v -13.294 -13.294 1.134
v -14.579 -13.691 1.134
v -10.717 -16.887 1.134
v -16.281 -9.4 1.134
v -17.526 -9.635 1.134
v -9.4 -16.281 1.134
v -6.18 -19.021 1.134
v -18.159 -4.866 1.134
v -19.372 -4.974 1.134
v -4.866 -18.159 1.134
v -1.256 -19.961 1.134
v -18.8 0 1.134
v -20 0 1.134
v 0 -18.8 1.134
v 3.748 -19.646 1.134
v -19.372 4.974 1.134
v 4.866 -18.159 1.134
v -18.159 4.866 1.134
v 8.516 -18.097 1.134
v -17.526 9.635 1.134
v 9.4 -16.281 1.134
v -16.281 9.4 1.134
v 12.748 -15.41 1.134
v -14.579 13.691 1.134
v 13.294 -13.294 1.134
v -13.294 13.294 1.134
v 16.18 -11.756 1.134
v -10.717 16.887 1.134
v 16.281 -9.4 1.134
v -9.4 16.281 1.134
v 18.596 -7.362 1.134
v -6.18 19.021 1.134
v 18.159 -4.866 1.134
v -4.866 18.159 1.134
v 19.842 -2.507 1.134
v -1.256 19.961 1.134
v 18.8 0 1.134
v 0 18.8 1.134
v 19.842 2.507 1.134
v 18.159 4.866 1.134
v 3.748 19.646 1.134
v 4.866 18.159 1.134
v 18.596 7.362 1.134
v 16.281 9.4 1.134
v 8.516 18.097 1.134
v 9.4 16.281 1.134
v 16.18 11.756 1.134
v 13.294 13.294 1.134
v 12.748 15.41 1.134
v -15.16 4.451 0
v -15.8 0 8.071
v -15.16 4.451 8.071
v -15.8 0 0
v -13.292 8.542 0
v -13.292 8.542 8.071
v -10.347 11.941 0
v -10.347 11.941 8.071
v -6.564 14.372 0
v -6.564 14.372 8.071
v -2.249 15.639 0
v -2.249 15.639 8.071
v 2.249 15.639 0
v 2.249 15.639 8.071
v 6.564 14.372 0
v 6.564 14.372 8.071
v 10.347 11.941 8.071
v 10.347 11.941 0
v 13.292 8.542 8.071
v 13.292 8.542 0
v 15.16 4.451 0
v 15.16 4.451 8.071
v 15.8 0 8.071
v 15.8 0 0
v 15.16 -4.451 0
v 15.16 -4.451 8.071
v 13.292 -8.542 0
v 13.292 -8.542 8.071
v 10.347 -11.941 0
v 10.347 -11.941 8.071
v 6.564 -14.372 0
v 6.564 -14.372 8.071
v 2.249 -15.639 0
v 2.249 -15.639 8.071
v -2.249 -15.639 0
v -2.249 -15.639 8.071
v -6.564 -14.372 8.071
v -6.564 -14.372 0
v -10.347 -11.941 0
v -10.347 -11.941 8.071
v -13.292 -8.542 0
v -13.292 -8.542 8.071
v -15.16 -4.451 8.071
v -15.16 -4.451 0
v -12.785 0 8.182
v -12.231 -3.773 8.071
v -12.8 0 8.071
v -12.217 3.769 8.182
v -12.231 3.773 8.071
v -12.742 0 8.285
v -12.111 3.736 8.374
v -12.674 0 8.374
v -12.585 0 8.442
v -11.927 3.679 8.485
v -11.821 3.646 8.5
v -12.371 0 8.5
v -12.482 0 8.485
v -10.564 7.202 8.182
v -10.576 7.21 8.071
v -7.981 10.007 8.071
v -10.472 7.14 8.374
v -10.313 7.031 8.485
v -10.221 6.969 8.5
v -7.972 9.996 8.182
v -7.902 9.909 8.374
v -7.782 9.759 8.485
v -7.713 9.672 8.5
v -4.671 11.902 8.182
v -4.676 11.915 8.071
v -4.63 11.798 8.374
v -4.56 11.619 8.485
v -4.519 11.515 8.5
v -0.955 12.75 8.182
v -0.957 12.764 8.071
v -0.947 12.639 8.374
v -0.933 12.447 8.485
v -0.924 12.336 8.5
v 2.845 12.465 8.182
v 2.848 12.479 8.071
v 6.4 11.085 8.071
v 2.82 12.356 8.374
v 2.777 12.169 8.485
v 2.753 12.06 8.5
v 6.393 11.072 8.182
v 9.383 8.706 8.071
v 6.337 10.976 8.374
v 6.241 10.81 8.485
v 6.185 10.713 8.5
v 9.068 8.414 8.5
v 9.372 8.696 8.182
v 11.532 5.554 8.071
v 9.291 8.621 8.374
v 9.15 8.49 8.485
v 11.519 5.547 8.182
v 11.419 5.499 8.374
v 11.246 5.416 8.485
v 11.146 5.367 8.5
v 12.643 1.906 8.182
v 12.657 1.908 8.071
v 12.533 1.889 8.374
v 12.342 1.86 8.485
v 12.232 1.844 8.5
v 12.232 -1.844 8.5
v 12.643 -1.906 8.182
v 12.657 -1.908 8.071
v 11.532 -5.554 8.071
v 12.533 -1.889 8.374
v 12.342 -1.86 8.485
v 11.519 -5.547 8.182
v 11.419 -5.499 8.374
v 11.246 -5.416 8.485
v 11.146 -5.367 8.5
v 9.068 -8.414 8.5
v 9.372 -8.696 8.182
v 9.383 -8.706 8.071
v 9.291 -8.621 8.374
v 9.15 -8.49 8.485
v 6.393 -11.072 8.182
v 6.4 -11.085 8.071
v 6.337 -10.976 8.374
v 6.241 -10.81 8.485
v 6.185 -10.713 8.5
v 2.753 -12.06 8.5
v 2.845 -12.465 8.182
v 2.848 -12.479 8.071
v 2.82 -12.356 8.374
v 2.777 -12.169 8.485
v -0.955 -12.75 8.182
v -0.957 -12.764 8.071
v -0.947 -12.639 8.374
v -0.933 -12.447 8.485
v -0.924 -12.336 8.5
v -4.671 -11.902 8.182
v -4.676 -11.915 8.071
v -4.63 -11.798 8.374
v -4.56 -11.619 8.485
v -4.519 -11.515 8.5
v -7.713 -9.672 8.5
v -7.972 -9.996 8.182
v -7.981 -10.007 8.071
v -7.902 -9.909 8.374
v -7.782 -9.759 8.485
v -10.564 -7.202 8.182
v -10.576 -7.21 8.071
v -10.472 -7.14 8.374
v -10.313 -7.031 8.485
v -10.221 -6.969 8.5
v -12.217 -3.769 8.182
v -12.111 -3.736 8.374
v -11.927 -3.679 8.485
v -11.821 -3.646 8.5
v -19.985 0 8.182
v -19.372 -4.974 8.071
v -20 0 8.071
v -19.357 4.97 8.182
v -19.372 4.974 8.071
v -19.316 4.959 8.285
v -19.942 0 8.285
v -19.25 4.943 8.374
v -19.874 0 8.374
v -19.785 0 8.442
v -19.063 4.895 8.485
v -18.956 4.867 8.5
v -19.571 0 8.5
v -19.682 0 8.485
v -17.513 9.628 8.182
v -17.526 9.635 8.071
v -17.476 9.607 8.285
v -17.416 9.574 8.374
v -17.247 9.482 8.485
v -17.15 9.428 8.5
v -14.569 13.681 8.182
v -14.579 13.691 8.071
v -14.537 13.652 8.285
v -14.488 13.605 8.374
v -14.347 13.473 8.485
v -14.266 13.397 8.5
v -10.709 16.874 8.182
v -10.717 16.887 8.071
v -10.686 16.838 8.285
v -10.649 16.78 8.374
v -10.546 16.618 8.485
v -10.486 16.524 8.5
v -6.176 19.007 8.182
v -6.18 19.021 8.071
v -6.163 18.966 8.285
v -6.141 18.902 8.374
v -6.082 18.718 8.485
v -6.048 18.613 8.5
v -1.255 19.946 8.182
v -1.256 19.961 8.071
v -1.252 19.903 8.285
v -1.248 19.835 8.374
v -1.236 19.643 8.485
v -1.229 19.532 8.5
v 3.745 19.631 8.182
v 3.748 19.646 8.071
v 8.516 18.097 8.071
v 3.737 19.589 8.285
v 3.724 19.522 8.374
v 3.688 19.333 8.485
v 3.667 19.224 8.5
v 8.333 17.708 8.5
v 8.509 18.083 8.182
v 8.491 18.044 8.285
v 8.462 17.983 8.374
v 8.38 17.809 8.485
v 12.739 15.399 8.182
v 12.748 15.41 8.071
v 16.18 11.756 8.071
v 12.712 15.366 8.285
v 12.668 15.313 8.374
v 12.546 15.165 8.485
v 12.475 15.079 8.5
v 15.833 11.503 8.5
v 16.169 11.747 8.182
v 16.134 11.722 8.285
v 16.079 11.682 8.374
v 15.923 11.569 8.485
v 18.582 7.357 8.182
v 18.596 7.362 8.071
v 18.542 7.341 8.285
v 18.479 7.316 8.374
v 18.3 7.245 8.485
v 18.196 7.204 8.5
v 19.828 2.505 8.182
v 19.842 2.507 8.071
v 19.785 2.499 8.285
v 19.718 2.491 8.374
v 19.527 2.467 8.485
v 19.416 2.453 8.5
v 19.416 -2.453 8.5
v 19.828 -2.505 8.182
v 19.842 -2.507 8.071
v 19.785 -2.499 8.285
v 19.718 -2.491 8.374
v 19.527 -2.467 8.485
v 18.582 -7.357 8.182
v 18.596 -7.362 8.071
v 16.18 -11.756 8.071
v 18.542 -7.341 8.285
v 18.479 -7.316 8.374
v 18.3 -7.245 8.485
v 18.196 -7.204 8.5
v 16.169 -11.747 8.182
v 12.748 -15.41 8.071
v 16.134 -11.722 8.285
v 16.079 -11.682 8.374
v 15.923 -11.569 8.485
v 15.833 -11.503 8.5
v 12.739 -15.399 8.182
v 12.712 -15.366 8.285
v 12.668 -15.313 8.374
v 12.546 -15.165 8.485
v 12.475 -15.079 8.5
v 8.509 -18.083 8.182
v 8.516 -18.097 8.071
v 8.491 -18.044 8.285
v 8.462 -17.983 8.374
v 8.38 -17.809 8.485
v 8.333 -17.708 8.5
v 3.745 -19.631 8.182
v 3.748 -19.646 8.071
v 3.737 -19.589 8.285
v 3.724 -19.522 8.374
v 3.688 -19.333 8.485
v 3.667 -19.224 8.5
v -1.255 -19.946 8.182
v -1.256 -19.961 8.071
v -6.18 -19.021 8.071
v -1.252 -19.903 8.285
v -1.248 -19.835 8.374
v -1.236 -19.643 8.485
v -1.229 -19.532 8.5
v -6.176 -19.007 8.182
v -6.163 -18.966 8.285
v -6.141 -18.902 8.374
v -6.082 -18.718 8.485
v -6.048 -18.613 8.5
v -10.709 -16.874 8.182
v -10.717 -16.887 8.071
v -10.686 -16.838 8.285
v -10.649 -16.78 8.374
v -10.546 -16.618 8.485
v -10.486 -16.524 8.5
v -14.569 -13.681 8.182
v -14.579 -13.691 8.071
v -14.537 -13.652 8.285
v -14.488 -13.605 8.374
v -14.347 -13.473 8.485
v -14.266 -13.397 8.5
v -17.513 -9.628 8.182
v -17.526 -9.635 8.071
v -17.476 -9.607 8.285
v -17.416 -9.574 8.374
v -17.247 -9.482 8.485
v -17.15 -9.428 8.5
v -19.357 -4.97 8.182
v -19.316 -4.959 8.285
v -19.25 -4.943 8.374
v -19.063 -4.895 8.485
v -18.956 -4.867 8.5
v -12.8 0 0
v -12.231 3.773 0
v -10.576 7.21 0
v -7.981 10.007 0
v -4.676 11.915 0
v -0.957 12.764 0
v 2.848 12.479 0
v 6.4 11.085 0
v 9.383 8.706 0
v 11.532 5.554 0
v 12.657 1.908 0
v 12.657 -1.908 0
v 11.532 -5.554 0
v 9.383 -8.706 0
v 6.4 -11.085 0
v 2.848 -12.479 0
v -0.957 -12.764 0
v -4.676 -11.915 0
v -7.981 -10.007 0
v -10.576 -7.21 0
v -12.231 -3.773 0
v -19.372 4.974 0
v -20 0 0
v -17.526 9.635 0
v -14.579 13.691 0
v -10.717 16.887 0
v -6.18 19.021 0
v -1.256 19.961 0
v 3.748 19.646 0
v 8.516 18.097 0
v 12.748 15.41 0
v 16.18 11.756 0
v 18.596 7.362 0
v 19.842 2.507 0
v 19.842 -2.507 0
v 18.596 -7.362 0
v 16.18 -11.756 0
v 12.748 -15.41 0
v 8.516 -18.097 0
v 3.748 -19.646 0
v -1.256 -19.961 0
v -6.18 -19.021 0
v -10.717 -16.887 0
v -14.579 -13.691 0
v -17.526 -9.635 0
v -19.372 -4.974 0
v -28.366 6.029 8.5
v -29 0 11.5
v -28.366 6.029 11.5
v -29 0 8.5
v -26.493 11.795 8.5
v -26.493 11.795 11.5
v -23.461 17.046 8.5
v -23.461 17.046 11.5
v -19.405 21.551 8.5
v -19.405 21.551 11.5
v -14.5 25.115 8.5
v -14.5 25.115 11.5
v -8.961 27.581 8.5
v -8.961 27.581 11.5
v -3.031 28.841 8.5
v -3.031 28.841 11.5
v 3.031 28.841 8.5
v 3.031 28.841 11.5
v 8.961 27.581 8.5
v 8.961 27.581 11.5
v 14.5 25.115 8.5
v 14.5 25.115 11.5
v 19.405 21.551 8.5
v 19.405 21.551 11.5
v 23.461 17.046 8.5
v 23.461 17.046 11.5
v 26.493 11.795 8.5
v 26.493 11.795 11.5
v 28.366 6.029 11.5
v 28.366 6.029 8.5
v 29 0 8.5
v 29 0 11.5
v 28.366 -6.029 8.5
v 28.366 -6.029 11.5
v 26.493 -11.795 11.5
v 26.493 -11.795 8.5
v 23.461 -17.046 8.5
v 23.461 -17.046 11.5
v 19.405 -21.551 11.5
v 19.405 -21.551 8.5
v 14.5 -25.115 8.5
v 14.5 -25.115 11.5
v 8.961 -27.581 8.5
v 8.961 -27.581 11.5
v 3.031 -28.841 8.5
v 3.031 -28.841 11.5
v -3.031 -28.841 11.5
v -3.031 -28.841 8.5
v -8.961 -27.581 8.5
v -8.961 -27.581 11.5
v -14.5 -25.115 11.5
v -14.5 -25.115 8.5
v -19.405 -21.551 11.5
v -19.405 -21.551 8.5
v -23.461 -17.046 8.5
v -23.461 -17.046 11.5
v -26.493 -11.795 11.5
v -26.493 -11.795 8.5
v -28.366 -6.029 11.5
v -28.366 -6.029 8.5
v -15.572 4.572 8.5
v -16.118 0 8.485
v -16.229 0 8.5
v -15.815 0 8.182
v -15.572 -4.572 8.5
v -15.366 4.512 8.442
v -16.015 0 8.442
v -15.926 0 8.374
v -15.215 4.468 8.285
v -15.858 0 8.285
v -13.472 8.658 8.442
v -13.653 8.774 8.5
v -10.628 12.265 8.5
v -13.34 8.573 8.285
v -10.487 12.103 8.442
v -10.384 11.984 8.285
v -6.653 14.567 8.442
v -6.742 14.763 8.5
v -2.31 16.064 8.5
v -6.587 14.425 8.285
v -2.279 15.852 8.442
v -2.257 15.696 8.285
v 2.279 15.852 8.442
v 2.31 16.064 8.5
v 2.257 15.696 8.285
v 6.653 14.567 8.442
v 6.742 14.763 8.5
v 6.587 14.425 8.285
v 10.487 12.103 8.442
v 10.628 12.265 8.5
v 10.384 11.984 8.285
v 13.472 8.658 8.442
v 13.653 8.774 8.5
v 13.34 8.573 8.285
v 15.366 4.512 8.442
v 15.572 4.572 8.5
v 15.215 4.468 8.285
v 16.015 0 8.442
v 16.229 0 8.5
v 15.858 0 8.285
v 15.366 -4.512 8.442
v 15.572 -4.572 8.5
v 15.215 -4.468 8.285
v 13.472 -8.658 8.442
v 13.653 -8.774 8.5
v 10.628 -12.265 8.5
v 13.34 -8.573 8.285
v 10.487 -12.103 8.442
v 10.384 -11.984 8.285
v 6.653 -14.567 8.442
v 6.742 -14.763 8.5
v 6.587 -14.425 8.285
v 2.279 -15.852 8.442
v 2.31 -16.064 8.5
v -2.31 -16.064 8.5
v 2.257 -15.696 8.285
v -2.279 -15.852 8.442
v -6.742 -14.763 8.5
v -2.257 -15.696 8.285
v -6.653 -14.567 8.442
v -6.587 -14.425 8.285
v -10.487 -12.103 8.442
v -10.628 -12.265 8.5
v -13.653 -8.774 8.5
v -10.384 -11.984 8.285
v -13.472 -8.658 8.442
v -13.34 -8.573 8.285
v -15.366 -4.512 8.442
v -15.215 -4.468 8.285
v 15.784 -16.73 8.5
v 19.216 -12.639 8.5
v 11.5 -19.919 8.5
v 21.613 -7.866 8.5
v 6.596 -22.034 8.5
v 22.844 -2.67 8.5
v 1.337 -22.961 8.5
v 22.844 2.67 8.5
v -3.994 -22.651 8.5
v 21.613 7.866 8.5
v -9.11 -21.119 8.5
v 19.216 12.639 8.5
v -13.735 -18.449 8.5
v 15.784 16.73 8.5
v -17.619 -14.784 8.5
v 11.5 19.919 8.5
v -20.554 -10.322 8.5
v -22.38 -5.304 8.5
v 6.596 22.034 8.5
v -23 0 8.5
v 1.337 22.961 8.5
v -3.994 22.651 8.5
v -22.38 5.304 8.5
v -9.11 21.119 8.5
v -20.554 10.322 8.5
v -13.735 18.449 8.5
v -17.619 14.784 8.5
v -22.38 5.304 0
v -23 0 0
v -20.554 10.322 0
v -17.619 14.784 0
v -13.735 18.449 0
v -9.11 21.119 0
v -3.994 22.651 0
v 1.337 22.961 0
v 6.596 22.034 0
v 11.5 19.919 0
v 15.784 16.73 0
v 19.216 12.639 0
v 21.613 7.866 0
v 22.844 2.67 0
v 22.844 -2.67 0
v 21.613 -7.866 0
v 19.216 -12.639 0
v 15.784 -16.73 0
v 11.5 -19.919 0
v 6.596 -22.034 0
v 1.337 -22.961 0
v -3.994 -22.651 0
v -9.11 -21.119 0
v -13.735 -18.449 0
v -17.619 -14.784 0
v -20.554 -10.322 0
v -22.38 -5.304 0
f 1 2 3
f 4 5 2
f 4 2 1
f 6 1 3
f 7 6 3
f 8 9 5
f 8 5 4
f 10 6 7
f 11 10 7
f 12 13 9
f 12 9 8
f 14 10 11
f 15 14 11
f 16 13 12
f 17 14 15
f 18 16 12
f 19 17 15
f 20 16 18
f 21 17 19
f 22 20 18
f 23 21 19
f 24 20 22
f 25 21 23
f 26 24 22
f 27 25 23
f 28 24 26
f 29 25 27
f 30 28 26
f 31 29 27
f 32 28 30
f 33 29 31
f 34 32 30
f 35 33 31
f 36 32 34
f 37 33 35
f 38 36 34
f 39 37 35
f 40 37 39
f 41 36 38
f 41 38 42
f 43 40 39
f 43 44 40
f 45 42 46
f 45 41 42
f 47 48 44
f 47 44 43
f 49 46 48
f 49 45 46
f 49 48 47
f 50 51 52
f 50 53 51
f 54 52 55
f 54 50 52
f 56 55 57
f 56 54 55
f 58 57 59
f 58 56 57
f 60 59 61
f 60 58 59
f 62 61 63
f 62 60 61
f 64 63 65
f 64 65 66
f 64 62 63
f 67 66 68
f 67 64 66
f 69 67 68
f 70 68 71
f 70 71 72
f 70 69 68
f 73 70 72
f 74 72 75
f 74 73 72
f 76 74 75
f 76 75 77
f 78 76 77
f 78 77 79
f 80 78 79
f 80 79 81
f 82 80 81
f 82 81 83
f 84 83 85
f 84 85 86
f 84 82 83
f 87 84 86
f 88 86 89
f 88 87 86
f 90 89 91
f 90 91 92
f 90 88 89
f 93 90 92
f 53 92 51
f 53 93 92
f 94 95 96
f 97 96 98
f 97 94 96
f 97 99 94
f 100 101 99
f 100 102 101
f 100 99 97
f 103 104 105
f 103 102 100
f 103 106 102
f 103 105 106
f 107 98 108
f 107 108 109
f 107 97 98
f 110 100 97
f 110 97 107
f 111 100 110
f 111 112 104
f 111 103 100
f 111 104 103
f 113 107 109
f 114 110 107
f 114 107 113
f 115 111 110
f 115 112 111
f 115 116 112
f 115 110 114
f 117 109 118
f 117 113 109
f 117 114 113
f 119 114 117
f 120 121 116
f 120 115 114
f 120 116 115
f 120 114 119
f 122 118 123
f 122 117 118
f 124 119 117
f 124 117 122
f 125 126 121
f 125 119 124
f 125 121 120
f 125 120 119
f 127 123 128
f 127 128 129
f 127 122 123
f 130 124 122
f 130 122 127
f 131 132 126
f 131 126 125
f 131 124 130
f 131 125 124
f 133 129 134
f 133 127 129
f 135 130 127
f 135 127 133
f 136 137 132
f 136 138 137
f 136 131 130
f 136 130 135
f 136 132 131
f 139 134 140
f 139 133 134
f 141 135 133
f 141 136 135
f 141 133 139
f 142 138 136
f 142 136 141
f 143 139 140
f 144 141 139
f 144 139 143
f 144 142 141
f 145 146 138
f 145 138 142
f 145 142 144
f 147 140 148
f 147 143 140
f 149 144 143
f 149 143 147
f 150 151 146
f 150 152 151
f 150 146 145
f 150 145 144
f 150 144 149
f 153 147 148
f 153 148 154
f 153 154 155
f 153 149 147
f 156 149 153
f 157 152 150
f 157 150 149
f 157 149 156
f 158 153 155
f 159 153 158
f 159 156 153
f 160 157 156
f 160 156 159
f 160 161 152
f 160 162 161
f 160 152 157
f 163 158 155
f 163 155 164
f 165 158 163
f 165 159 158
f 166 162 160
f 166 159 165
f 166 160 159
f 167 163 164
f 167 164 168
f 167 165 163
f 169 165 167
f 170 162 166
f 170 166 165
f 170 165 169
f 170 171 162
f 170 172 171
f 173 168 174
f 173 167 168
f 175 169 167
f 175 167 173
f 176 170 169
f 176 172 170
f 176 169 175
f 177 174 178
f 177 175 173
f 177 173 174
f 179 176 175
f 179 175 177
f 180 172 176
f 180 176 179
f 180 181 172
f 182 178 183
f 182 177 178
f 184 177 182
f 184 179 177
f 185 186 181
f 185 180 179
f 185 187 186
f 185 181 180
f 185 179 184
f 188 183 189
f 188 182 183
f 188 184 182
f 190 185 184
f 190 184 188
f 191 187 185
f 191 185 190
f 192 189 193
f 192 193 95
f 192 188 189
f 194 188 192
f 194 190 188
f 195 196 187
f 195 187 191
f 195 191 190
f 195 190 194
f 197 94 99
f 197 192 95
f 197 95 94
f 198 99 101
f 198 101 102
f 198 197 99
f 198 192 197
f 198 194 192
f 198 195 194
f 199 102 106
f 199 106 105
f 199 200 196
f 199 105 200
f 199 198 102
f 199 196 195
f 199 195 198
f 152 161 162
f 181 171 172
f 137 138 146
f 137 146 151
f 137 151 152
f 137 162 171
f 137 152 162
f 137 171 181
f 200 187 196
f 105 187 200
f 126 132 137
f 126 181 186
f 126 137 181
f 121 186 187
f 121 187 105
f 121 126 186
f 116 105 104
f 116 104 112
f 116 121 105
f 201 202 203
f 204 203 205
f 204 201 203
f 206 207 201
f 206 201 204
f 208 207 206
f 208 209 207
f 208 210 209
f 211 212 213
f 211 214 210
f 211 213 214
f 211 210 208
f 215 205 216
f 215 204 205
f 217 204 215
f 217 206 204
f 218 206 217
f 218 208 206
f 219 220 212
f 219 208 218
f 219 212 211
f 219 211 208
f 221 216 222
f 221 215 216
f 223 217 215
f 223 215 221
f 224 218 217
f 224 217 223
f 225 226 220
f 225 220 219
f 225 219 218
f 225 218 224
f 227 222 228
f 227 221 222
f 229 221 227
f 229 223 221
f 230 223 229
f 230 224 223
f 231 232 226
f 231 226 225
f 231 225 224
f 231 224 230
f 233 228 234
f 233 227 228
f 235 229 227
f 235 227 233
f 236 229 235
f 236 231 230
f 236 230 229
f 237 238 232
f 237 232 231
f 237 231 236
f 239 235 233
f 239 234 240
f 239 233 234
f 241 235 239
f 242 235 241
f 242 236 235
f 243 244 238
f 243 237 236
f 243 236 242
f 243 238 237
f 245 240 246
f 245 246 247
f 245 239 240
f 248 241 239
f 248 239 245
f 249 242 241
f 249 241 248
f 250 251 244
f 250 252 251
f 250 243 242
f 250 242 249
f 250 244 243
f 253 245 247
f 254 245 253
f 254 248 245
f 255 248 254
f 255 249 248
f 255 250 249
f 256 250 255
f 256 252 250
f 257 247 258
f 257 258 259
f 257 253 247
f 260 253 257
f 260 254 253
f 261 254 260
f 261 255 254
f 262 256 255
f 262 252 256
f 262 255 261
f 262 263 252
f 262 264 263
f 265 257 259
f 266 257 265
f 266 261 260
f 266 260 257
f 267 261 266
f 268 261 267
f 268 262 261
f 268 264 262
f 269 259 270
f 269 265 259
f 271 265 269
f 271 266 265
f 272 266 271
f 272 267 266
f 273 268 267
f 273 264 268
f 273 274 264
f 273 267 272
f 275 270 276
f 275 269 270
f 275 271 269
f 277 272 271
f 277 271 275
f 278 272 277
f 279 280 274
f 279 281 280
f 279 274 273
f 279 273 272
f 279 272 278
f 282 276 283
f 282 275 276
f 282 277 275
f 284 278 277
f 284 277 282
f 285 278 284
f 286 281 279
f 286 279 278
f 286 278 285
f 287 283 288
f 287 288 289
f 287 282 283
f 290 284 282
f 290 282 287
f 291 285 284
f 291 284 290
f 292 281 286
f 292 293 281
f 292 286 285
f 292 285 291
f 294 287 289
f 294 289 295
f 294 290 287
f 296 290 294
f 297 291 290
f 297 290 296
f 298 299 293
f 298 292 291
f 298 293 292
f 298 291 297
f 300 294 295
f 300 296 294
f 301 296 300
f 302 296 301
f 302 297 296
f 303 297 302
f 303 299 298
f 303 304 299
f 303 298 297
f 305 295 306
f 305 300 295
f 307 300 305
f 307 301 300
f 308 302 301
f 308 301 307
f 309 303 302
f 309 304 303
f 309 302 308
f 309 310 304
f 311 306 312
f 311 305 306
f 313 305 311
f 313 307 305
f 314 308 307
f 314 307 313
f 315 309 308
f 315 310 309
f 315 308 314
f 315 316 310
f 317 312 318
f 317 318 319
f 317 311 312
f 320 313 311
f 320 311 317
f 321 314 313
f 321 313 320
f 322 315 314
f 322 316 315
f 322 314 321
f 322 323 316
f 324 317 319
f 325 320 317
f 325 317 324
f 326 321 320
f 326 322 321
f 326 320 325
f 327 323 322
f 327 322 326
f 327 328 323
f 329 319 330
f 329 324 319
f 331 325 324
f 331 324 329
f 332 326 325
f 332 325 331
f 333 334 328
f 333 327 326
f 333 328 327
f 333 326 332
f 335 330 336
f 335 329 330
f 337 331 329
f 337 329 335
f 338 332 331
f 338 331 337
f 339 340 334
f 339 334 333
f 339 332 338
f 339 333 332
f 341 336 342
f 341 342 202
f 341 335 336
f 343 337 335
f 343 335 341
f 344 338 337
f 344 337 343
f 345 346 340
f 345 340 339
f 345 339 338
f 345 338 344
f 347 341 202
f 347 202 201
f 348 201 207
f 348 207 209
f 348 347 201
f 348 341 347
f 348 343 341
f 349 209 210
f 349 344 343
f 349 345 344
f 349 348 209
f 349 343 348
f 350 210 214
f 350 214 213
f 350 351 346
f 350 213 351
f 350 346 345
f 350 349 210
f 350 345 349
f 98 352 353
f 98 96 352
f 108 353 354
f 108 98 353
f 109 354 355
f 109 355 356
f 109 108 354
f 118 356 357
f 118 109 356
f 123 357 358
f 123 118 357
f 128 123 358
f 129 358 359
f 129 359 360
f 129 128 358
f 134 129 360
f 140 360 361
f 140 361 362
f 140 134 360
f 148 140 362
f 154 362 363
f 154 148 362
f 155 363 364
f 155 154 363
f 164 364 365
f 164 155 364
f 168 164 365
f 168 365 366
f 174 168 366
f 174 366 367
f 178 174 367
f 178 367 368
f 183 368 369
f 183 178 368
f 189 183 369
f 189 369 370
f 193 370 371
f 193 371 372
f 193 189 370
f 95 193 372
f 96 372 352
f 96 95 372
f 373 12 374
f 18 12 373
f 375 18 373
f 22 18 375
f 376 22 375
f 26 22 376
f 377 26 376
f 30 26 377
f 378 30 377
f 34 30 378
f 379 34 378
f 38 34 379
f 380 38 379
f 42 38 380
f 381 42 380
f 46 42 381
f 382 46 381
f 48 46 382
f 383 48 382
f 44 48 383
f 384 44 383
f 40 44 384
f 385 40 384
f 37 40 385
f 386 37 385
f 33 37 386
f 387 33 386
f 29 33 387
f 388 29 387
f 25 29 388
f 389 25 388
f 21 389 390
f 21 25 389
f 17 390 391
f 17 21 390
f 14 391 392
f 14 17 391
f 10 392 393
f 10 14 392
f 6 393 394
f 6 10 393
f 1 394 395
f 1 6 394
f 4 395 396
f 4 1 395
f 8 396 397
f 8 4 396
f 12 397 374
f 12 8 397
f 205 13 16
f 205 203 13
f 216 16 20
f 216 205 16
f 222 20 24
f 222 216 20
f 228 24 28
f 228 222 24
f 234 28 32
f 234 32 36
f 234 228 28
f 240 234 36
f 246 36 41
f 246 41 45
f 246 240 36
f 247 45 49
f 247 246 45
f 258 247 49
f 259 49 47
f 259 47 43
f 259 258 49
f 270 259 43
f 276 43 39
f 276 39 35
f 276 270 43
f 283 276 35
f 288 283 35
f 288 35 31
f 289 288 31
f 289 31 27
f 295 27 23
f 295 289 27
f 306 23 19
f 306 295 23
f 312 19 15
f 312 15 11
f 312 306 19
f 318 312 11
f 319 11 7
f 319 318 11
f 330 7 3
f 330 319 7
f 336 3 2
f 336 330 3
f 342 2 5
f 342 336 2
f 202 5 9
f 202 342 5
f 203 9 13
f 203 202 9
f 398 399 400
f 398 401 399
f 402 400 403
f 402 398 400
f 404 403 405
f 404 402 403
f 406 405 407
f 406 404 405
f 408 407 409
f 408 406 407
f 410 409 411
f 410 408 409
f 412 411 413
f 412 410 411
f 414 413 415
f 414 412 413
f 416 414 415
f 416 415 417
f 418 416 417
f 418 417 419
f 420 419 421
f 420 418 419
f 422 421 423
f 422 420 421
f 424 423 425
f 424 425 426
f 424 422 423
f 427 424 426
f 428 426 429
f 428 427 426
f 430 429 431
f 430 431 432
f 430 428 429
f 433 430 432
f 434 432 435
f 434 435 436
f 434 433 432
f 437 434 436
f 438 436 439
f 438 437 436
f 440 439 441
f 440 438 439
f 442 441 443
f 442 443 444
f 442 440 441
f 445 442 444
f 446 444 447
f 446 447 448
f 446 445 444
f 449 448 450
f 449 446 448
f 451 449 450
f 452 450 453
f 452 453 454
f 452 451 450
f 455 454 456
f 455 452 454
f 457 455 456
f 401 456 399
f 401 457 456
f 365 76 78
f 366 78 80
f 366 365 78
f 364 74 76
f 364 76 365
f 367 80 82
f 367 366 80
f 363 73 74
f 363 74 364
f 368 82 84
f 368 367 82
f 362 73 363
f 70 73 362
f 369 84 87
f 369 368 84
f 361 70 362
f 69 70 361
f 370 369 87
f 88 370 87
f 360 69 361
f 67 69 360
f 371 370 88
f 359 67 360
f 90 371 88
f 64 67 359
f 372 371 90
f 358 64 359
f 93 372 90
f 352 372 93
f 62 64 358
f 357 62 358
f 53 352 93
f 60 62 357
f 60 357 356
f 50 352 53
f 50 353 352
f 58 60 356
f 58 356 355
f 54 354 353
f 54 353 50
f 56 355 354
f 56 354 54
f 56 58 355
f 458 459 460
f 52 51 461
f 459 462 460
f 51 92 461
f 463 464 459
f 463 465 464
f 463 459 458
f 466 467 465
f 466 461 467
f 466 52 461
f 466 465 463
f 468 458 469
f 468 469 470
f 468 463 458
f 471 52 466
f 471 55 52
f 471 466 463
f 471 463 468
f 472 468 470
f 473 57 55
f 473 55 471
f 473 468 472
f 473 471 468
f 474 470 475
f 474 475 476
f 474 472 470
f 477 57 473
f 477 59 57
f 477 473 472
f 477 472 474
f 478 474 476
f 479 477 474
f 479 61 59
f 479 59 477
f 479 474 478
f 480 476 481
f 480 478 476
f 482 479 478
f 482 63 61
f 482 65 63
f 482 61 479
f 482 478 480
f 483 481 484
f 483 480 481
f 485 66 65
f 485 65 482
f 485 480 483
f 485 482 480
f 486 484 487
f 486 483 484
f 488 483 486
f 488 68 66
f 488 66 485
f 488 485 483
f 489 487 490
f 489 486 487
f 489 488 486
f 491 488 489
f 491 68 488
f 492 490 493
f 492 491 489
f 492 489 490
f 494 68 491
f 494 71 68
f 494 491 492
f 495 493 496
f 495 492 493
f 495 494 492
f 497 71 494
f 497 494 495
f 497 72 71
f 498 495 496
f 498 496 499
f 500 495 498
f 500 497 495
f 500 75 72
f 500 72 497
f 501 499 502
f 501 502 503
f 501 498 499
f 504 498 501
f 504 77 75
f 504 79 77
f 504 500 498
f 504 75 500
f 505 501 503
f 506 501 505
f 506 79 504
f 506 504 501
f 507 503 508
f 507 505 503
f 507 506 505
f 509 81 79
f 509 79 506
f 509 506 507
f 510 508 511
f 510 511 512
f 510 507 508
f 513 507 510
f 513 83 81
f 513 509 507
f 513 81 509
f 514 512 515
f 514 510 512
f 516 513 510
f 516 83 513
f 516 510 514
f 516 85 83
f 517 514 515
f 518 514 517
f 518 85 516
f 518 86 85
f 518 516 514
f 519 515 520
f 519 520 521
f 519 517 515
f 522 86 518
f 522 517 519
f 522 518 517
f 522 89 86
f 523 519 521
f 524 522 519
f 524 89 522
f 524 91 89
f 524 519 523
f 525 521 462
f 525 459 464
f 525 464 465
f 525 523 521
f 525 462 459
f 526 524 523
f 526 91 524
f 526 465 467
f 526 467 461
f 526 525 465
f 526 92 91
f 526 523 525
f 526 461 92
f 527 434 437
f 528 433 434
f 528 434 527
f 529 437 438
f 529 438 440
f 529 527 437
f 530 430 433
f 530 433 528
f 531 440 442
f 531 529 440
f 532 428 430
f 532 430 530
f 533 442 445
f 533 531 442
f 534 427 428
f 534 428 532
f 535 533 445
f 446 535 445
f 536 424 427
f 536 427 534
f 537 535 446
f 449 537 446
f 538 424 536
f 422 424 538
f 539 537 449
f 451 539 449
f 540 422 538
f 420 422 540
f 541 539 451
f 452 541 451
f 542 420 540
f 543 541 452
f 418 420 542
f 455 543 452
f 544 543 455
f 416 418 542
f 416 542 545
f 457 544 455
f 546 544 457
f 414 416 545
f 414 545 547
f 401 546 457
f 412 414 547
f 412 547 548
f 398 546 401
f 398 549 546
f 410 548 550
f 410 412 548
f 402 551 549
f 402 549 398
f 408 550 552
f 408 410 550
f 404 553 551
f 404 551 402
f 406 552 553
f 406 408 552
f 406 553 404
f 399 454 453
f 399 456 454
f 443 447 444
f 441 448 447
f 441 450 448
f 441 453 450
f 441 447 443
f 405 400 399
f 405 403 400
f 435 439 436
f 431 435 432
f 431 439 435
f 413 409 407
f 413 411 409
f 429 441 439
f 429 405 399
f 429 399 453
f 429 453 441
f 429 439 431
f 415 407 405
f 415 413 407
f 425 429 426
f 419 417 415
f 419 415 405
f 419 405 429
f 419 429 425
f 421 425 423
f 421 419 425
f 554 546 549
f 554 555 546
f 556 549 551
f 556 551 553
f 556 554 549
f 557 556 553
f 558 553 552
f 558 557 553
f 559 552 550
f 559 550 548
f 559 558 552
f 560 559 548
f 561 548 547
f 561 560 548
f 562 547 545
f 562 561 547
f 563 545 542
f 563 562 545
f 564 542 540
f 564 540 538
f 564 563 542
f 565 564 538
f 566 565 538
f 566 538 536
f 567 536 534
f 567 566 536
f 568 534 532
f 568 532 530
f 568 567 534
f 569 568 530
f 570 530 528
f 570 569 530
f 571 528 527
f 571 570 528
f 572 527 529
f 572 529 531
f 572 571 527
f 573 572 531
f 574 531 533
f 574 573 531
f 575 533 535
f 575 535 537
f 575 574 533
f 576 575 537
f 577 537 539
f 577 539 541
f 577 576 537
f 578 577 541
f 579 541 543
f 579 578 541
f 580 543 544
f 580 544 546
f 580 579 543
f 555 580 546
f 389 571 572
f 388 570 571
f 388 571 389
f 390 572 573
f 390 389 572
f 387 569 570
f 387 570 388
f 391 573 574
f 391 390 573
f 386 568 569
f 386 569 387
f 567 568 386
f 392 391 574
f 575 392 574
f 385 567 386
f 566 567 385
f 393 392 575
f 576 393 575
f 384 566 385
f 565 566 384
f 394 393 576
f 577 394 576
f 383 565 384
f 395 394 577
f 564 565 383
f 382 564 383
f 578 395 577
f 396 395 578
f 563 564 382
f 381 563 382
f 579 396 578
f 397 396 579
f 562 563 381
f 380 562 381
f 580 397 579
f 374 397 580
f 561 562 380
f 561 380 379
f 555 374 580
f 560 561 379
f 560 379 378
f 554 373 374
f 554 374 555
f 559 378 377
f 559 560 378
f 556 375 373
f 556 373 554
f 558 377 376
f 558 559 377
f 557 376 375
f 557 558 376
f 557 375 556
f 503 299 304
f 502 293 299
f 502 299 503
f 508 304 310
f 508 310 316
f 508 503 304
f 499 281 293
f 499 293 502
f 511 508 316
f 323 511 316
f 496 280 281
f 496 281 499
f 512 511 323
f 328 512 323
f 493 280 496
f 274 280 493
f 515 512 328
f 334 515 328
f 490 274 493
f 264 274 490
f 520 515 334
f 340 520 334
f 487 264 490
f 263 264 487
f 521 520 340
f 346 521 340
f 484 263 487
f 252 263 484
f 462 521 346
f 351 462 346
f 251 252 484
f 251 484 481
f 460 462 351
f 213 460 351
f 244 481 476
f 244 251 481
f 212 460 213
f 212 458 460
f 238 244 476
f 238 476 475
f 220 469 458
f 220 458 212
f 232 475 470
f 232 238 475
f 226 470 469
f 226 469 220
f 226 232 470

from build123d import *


with BuildPart() as f1:
    # F0 (on Front) → F1 (revolve)
    with BuildSketch(Plane.XZ):
        with BuildLine():
            Line((-15.8, 8.07061), (-15.8, 0))
            Line((-15.8, 0), (-12.8, 0))
            Line((-12.8, 0), (-12.8, 8.07061))
            ThreePointArc((-12.8, 8.07061), (-12.674235, 8.374235), (-12.37061, 8.5))
            Line((-12.37061, 8.5), (0, 8.5))
            Line((0, 8.5), (0, 11.5))
            Line((0, 11.5), (-23, 11.5))
            Line((-23, 11.5), (-29, 11.5))
            Line((-29, 11.5), (-29, 8.5))
            Line((-29, 8.5), (-23, 8.5))
            Line((-23, 8.5), (-23, 0))
            Line((-23, 0), (-20, 0))
            Line((-20, 0), (-18.8, 1.134371))
            Line((-18.8, 1.134371), (-20, 1.134371))
            Line((-20, 1.134371), (-20, 8.07061))
            ThreePointArc((-20, 8.07061), (-19.874235, 8.374235), (-19.57061, 8.5))
            Line((-19.57061, 8.5), (-16.22939, 8.5))
            ThreePointArc((-16.22939, 8.5), (-15.925765, 8.374235), (-15.8, 8.07061))
        make_face()
    revolve(axis=Axis((0, 0, 10), (0, 0, -1)))


solid = f1.part
